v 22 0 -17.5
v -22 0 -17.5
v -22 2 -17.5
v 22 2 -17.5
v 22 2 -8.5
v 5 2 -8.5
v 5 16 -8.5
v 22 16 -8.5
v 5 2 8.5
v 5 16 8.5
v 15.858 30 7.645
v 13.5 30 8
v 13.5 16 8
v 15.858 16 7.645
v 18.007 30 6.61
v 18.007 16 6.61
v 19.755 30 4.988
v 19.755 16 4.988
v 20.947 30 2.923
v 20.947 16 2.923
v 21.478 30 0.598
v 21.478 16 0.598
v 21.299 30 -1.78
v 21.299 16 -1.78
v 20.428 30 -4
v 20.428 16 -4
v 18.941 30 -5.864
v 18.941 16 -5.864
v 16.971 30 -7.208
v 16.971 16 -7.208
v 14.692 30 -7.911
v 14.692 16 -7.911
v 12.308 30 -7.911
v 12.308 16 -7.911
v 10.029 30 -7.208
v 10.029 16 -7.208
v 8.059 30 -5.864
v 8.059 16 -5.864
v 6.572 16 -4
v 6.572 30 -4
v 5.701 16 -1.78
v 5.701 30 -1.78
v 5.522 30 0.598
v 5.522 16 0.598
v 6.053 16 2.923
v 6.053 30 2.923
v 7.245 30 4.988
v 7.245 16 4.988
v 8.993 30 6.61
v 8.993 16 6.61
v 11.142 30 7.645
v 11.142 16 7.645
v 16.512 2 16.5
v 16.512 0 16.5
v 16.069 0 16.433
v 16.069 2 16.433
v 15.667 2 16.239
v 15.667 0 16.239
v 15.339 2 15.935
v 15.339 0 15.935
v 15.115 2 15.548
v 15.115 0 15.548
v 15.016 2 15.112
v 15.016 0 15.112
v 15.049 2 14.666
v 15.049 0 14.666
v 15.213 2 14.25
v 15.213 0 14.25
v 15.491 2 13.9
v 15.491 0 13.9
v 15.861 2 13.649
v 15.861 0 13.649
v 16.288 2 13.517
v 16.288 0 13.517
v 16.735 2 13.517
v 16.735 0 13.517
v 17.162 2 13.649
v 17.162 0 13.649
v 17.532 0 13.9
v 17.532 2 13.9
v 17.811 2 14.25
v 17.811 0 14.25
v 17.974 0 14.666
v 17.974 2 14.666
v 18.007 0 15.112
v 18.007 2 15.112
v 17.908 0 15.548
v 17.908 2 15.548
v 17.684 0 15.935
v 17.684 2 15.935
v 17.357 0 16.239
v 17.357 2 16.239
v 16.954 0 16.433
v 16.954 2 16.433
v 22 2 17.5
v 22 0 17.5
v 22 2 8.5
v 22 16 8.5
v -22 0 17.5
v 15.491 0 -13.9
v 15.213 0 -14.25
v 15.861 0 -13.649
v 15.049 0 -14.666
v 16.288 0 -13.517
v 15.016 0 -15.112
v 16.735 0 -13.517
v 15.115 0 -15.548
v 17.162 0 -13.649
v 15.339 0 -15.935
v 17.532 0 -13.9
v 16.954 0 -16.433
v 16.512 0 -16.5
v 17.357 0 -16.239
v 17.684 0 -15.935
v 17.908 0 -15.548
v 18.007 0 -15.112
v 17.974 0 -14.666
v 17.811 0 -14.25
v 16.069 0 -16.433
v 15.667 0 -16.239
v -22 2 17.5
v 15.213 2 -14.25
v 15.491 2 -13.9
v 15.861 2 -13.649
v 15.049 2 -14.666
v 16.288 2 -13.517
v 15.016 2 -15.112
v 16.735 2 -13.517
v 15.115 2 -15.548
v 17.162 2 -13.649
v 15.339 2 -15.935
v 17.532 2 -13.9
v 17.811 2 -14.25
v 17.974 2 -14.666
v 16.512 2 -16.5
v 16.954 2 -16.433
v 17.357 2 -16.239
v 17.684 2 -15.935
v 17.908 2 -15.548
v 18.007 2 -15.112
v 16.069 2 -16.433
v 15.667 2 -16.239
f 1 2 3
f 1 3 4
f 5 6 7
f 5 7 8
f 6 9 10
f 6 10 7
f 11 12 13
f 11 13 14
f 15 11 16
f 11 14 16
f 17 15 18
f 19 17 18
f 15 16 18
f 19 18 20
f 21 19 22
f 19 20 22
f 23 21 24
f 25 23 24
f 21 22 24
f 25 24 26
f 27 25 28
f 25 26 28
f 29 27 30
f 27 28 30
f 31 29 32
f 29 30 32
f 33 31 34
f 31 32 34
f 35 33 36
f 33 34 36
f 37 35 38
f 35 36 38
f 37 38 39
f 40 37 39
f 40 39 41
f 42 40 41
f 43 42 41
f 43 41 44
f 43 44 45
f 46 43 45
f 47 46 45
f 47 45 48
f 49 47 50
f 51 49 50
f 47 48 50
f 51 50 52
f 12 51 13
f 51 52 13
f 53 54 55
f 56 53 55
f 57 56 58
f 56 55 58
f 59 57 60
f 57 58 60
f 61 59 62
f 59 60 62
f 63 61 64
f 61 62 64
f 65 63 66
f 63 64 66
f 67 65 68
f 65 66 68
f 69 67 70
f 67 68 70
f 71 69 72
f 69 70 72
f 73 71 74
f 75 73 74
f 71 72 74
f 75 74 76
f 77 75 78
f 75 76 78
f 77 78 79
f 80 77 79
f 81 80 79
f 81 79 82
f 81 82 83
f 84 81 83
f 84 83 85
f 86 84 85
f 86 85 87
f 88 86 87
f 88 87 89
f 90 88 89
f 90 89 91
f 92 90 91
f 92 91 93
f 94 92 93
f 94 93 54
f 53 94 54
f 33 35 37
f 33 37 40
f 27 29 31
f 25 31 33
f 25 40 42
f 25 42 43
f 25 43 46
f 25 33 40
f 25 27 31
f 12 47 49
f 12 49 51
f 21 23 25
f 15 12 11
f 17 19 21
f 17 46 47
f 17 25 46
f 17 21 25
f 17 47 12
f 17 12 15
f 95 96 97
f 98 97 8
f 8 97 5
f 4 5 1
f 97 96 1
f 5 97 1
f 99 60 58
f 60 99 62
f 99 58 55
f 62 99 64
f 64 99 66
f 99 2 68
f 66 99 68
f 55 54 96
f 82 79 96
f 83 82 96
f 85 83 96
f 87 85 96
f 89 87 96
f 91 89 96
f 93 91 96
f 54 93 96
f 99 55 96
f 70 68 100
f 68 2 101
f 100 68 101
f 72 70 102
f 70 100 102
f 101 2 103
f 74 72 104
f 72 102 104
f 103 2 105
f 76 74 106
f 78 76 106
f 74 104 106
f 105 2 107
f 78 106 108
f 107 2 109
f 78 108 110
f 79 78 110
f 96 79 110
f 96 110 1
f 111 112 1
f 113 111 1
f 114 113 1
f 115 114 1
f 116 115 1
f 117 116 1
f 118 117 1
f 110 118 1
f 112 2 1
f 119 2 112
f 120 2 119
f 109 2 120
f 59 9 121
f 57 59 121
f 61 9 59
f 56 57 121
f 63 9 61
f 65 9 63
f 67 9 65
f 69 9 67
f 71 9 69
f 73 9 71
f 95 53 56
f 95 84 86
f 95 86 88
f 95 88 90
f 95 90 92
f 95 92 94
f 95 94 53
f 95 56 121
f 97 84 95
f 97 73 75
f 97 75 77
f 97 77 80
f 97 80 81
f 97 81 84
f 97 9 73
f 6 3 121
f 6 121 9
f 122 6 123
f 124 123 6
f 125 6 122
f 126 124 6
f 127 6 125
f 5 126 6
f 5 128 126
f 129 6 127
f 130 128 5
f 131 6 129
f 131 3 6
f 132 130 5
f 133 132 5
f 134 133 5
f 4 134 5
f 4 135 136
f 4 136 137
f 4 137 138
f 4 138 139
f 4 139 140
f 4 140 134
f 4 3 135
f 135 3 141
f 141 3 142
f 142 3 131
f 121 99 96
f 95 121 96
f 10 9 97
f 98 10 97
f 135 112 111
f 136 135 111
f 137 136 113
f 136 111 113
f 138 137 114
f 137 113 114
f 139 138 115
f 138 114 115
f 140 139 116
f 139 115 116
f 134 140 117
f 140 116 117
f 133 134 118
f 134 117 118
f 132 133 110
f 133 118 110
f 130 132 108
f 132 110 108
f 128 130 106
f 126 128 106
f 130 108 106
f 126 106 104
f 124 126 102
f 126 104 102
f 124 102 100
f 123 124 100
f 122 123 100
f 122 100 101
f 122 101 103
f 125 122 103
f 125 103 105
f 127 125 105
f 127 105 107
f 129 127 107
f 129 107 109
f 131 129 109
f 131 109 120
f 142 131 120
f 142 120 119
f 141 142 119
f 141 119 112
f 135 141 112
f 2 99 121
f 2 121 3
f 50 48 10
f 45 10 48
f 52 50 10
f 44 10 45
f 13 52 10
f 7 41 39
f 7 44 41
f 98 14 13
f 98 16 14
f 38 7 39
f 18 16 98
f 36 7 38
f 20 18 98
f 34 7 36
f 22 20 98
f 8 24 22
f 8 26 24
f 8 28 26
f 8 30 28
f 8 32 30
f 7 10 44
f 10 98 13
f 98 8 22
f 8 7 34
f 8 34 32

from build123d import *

# Parameters (mm, degrees)
SKETCH_1_W          = 44
SKETCH_1_H          = 35
EXTRUDE_1_DEPTH     = 2
SKETCH_2_W          = 17
SKETCH_2_H          = 17
EXTRUDE_2_DEPTH     = 14
SKETCH_3_R          = 8
EXTRUDE_3_DEPTH     = 14
SKETCH_4_R          = 1.5
CUT_EXTRUDE_1_DEPTH = 10


with BuildPart() as part:
    # 草图1 → 凸台-拉伸1 (new body)
    with BuildSketch(Plane(origin=(0, 0, 0), x_dir=(1, 0, 0), z_dir=(0, 1, 0))):
        Rectangle(SKETCH_1_W, SKETCH_1_H)
    extrude(amount=EXTRUDE_1_DEPTH)

    # 草图2 → 凸台-拉伸2 (add)
    with BuildSketch(Plane(origin=(0, 2, 0), x_dir=(1, 0, 0), z_dir=(0, 1, 0))):
        with Locations((13.5, 0)):
            Rectangle(SKETCH_2_W, SKETCH_2_H)
    extrude(amount=EXTRUDE_2_DEPTH)

    # 草图3 → 凸台-拉伸3 (add)
    with BuildSketch(Plane(origin=(0, 16, 0), x_dir=(1, 0, 0), z_dir=(0, 1, 0))):
        with Locations(Location((13.5, 0, 0), (0, 0, 270))):
            Circle(SKETCH_3_R)
    extrude(amount=EXTRUDE_3_DEPTH)

    # 草图4 → 切除-拉伸1 (cut)
    with BuildSketch(Plane.XZ):
        with Locations(Location((16.511574999, -15, 0), (0, 0, 270))):
            Circle(SKETCH_4_R)
        with Locations(Location((16.511574999, 15, 0), (0, 0, 90))):
            Circle(SKETCH_4_R)
    extrude(amount=-CUT_EXTRUDE_1_DEPTH, mode=Mode.SUBTRACT)


solid = part.part
